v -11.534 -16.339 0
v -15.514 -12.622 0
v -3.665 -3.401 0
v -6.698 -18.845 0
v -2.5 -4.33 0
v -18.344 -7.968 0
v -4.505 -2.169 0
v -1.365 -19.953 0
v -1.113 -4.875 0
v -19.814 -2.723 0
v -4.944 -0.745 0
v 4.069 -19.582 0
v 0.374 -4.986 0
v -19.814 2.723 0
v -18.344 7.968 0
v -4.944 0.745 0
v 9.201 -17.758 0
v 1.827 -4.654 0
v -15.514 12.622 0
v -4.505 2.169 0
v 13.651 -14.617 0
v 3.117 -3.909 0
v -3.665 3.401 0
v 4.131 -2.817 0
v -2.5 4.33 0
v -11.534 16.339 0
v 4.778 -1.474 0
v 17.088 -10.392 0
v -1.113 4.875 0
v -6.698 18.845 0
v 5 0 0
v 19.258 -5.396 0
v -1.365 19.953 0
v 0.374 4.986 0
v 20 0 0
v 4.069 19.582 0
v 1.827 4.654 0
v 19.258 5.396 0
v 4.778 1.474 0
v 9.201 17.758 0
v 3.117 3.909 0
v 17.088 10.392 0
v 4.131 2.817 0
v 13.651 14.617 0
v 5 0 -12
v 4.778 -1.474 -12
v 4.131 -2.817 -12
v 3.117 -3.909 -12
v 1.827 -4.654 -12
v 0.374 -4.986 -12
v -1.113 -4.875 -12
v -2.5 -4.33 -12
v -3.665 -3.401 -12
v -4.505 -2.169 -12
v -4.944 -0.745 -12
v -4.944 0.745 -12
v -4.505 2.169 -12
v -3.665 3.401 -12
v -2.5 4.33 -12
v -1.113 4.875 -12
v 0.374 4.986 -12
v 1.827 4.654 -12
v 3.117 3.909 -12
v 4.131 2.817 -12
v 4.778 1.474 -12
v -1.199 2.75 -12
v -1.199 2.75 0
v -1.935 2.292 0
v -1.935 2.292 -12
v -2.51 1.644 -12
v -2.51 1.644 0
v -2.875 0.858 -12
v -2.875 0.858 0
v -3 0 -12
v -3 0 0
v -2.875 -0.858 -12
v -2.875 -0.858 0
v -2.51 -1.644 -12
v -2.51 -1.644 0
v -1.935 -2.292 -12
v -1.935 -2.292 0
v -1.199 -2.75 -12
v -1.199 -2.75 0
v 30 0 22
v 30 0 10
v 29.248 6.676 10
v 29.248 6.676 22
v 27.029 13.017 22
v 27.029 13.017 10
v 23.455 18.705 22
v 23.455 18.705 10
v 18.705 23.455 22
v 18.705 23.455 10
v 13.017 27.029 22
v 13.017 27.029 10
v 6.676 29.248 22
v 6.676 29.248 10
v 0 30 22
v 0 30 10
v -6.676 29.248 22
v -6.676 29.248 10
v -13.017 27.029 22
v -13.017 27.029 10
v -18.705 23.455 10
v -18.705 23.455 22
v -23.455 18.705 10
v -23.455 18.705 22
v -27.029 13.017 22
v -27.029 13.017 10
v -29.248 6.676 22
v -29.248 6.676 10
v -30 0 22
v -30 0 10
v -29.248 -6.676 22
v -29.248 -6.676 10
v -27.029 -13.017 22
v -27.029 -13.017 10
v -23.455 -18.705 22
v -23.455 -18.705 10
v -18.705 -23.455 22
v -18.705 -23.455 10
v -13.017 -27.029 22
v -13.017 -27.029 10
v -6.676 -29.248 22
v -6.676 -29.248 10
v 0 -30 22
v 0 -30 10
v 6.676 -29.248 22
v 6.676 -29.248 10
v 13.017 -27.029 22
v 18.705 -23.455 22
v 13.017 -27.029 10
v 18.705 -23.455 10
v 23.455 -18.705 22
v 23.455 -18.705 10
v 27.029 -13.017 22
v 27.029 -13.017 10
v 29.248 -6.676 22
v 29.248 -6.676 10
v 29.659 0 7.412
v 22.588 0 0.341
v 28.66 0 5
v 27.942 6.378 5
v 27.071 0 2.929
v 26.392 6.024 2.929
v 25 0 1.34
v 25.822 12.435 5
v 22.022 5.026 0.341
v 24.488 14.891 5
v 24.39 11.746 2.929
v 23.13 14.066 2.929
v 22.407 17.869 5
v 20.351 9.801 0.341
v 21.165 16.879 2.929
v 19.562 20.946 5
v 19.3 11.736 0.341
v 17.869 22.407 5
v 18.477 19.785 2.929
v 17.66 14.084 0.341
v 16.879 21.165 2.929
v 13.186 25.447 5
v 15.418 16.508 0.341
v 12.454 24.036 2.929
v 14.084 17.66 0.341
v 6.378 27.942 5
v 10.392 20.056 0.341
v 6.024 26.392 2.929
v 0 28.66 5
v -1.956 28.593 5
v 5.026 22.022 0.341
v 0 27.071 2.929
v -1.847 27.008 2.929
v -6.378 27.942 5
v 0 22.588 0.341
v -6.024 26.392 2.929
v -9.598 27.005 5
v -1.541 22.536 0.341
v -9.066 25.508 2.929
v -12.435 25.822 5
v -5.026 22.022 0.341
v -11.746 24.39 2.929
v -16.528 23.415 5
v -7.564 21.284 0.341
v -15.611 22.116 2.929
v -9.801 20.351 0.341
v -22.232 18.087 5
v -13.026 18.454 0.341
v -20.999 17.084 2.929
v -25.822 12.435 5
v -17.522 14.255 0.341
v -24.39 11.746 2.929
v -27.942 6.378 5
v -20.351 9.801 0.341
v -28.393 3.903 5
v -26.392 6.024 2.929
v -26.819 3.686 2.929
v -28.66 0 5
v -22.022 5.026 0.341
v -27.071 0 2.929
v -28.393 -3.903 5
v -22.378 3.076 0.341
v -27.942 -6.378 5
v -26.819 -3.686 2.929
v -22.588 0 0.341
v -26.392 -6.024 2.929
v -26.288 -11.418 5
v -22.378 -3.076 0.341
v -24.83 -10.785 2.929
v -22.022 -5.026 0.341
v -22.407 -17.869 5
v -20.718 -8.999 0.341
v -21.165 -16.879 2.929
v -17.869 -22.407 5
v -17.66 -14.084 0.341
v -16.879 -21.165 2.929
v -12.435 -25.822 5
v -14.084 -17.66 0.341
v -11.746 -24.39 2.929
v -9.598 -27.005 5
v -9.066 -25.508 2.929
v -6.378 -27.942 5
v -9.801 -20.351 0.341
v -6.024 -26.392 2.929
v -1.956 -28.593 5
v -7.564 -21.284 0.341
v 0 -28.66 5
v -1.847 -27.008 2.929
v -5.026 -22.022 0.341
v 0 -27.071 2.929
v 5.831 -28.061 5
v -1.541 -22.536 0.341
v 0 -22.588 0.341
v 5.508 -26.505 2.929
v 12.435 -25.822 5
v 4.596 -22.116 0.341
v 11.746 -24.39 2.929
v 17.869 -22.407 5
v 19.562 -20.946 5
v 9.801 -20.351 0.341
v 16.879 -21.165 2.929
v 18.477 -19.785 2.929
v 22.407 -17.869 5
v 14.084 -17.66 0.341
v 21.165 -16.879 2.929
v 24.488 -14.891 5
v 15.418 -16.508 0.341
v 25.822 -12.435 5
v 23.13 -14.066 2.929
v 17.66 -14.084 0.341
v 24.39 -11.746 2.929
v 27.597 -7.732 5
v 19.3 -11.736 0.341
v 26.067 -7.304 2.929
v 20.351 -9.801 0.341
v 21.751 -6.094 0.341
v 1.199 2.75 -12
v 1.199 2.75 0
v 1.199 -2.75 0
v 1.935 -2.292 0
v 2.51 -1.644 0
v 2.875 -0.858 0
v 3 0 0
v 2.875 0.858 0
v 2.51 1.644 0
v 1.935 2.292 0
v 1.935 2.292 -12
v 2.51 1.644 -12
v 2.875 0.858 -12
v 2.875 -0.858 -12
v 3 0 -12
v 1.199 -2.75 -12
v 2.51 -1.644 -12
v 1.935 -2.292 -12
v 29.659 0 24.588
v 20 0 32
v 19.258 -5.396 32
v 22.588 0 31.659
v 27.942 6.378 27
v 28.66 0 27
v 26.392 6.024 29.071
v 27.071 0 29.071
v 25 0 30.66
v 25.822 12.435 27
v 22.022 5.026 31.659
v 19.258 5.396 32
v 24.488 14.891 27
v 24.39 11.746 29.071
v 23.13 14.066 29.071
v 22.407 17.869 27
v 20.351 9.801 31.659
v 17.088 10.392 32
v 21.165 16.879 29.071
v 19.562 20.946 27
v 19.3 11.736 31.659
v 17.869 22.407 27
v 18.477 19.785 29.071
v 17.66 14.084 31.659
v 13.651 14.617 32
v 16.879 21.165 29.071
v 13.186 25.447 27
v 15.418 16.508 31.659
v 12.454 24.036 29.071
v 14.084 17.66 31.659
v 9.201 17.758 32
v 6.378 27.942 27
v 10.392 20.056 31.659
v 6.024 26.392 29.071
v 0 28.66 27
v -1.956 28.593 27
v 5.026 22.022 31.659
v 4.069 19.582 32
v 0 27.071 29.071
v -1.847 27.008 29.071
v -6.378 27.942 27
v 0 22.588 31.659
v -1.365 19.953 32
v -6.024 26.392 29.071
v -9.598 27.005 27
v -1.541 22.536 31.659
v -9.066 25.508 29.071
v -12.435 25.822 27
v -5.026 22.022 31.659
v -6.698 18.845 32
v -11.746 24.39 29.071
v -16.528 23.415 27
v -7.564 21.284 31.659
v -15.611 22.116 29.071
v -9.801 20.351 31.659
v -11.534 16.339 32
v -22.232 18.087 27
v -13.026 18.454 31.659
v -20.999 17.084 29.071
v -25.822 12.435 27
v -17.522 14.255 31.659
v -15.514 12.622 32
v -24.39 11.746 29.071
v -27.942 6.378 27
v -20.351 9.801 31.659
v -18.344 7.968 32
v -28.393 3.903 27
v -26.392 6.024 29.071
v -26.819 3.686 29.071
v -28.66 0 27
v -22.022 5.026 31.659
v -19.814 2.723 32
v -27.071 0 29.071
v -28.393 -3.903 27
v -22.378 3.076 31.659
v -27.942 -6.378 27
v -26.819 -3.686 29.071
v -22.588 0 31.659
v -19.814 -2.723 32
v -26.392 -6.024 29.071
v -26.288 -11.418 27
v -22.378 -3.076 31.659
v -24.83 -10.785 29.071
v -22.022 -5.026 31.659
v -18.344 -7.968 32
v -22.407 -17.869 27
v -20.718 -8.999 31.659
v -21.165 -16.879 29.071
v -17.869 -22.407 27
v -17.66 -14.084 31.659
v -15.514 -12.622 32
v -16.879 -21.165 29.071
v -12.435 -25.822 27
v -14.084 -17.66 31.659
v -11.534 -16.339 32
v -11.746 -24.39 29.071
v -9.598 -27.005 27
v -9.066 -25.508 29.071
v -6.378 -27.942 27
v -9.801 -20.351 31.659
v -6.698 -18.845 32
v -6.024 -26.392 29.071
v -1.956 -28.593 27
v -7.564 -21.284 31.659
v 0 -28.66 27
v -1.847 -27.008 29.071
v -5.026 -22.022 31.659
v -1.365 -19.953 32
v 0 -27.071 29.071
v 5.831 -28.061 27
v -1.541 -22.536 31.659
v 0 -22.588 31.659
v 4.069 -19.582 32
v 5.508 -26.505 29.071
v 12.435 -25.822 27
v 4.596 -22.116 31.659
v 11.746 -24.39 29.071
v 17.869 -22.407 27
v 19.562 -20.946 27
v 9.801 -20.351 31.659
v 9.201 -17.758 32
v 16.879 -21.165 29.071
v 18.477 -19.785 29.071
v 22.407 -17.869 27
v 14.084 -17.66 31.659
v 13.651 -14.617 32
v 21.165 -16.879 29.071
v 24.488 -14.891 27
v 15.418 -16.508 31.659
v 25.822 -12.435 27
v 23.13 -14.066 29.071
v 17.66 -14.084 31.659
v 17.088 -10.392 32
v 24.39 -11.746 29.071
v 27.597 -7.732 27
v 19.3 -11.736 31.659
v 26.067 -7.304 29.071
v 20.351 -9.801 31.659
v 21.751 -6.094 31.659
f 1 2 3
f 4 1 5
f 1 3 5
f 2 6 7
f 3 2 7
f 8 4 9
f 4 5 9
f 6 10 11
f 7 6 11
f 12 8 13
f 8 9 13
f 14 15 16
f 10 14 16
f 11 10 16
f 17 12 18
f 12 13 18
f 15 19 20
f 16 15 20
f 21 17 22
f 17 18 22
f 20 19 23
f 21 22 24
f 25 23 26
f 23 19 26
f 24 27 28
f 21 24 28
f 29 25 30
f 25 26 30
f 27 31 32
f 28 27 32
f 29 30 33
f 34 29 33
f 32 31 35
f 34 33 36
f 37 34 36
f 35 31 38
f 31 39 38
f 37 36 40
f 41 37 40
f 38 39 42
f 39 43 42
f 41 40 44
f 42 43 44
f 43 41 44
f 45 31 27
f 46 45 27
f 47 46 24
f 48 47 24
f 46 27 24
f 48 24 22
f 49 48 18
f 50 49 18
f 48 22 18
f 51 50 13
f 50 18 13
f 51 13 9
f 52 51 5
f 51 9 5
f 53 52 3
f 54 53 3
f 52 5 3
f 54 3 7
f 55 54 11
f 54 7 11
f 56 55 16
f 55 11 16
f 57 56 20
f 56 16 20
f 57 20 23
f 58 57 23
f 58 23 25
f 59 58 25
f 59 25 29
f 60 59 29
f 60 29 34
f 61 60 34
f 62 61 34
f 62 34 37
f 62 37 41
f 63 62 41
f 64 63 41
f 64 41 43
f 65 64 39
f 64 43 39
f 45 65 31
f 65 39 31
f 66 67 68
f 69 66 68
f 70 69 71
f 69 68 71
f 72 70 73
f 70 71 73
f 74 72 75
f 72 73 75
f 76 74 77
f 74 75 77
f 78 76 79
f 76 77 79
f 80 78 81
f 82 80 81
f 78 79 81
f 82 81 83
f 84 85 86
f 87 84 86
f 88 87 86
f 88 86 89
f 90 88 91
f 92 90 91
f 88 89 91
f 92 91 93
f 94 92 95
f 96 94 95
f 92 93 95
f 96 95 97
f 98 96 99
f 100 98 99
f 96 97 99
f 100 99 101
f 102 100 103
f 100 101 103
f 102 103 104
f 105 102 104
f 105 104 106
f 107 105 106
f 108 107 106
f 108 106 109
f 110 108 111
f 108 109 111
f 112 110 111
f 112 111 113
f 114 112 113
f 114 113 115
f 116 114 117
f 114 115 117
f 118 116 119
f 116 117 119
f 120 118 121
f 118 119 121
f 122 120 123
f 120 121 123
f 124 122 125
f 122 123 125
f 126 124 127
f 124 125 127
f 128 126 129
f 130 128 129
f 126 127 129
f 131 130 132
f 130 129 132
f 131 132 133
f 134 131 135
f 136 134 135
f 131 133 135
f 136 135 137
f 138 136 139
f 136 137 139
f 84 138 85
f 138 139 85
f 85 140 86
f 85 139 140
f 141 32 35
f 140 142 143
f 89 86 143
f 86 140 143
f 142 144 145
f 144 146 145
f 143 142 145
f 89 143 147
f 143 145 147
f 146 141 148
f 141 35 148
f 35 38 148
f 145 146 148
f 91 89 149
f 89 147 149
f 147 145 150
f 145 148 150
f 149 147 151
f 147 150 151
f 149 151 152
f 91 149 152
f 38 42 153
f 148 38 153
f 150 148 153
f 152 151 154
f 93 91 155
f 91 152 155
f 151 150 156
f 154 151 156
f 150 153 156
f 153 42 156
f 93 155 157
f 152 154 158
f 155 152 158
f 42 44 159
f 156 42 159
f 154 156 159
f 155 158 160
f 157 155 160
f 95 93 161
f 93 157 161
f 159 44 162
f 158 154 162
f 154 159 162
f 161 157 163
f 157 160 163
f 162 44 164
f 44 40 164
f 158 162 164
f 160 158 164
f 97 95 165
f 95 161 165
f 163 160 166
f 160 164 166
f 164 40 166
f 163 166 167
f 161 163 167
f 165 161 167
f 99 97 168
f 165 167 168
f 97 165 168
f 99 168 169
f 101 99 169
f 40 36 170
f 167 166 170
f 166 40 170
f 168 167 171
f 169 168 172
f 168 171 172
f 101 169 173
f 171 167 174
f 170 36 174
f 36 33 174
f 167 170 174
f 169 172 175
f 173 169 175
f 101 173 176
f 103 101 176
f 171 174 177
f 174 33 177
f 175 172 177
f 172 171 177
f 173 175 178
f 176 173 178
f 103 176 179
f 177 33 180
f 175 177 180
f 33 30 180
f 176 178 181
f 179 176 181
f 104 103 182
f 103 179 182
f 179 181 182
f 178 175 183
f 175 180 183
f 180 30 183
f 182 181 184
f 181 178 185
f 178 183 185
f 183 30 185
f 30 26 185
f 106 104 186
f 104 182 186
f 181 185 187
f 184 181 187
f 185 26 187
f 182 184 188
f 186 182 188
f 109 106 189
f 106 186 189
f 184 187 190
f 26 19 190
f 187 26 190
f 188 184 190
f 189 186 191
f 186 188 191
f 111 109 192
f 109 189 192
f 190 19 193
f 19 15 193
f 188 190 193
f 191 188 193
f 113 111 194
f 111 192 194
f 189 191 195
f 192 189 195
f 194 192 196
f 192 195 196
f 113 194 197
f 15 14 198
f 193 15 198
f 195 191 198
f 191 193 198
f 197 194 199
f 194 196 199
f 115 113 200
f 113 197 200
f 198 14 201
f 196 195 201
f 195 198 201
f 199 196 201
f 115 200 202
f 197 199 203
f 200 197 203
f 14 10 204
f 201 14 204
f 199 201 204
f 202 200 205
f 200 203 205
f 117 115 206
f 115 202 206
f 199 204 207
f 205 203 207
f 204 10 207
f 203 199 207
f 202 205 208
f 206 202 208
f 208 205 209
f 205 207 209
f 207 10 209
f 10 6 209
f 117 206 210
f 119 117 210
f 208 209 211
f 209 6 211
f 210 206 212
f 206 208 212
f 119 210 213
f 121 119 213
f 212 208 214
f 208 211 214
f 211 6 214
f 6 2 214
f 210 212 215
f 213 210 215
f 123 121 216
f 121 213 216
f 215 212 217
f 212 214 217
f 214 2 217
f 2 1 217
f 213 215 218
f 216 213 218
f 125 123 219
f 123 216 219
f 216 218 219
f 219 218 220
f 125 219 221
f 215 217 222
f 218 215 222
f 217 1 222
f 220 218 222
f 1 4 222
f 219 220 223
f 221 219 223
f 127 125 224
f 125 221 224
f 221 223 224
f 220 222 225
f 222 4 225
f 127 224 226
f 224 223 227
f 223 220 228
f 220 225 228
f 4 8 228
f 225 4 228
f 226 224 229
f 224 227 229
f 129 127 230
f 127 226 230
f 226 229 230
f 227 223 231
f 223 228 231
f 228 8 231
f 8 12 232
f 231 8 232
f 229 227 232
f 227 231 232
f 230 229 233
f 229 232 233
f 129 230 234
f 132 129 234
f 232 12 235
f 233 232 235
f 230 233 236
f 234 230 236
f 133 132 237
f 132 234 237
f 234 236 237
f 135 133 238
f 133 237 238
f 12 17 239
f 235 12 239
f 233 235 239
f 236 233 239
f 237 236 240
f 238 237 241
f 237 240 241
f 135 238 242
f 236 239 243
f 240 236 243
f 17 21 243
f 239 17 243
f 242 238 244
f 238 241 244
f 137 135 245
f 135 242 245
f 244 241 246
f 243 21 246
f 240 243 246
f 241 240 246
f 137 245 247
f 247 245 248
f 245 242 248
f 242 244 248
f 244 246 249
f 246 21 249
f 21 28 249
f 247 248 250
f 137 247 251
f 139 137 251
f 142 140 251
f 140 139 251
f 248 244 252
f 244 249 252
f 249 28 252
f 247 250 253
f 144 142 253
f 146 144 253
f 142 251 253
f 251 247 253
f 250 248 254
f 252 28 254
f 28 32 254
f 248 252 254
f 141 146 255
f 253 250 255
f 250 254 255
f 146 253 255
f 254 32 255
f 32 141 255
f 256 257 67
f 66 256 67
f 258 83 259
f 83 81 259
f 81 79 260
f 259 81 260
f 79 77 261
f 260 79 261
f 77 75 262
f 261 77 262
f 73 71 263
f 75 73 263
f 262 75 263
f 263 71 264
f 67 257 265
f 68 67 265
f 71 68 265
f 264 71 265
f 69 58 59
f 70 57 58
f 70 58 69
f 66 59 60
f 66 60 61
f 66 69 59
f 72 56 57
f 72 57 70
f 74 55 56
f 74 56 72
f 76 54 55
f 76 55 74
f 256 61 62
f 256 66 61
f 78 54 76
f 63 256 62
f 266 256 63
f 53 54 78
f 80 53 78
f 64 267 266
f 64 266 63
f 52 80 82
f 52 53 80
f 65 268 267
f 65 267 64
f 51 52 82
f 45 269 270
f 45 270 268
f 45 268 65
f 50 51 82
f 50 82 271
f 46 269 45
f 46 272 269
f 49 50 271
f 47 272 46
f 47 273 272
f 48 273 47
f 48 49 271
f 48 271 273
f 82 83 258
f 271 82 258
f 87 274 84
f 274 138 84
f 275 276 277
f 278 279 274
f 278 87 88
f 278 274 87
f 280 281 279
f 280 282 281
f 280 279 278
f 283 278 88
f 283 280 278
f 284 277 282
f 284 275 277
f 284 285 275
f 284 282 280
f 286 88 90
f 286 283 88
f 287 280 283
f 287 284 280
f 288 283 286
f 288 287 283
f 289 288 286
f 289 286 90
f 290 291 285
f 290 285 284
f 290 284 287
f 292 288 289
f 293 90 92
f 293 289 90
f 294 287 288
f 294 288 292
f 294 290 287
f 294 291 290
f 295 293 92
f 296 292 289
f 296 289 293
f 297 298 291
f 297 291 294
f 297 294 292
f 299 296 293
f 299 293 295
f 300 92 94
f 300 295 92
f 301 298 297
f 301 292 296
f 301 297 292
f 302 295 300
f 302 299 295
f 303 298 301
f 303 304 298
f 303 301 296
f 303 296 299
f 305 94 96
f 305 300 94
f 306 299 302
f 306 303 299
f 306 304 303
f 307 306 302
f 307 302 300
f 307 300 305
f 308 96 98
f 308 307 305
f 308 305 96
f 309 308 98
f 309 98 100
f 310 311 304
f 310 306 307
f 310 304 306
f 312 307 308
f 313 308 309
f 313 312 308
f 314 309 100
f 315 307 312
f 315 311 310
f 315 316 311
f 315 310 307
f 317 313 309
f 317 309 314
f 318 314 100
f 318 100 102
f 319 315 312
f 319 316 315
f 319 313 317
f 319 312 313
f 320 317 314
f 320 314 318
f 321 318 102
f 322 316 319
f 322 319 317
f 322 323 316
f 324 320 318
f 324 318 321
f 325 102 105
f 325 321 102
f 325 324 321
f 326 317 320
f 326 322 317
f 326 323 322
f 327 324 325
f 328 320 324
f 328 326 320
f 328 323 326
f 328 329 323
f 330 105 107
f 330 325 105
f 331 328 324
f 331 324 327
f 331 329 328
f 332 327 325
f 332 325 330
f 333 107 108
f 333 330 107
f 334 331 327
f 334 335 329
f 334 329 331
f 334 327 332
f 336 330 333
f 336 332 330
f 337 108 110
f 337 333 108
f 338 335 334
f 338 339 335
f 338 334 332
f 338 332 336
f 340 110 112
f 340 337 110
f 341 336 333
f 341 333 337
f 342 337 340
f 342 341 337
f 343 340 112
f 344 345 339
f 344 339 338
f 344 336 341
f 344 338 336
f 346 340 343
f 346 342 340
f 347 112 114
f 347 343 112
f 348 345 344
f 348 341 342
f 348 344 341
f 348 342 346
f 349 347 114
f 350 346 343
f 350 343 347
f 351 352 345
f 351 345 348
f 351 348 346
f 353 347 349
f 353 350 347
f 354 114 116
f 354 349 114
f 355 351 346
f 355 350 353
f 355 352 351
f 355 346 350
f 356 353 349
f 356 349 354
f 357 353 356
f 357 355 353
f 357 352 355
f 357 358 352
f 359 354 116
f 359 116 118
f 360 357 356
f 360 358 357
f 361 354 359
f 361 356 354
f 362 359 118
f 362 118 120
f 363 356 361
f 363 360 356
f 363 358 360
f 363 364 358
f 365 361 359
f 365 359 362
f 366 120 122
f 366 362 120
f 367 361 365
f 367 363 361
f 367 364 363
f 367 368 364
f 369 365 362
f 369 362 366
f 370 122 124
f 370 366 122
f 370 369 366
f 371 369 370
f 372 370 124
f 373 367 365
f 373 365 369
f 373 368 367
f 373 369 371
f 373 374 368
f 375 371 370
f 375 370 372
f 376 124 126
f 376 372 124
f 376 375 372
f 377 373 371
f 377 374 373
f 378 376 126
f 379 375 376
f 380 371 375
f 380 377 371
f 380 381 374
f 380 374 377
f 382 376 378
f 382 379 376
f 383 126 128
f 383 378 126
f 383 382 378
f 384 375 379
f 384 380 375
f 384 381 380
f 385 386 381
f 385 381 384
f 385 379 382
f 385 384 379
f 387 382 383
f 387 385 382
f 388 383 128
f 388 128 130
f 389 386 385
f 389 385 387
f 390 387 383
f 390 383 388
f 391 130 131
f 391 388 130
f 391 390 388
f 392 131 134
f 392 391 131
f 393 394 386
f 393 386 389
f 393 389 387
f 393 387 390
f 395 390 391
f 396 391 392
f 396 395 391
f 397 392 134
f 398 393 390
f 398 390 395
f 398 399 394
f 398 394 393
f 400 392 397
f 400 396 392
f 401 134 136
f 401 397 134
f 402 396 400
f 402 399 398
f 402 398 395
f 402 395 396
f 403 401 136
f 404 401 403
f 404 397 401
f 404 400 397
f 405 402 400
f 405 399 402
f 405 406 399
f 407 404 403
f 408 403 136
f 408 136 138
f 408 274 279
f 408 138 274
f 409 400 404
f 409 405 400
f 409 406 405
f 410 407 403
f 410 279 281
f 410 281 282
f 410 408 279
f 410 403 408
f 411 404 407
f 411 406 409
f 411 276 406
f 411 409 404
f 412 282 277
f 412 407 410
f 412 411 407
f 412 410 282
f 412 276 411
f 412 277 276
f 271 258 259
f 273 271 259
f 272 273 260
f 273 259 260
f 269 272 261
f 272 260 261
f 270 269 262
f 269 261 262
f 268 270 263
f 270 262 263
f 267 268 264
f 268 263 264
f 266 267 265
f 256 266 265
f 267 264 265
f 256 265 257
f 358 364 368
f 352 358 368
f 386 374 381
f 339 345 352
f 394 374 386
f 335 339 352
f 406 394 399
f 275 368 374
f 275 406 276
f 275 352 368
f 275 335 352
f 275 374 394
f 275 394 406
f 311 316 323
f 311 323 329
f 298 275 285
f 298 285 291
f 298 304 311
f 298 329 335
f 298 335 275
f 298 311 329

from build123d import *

# Parameters (mm, degrees)
SKETCH_1_R      = 30
EXTRUDE_1_DEPTH = 32
FILLET_1_R      = 10
SKETCH_2_R      = 5
EXTRUDE_2_DEPTH = 12


with BuildPart() as part:
    # Эскиз1 → Бобышка-Вытянуть1 (new body)
    with BuildSketch(Plane.XY):
        Circle(SKETCH_1_R)
    extrude(amount=EXTRUDE_1_DEPTH)

    # Скругление1
    fillet_1_edges = [part.edges().sort_by_distance(p)[0] for p in [
        (-30, 0, 0),
        (-30, 0, 32),
    ]]
    fillet(fillet_1_edges, radius=FILLET_1_R)

    # Эскиз2 → Бобышка-Вытянуть2 (add)
    with BuildSketch(Plane(origin=(0, 0, 0), x_dir=(-1, 0, 0), z_dir=(0, 0, -1))):
        with Locations(Location((0, 0, 0), (0, 0, 180))):
            Circle(SKETCH_2_R)
        with BuildLine():
            Line((-1.198957881, 2.75), (1.198957881, 2.75))
            ThreePointArc((1.198957881, 2.75), (3, 0), (1.198957881, -2.75))
            Line((1.198957881, -2.75), (-1.198957881, -2.75))
            ThreePointArc((-1.198957881, -2.75), (-3, 0), (-1.198957881, 2.75))
        make_face(mode=Mode.SUBTRACT)
    extrude(amount=EXTRUDE_2_DEPTH)


solid = part.part
